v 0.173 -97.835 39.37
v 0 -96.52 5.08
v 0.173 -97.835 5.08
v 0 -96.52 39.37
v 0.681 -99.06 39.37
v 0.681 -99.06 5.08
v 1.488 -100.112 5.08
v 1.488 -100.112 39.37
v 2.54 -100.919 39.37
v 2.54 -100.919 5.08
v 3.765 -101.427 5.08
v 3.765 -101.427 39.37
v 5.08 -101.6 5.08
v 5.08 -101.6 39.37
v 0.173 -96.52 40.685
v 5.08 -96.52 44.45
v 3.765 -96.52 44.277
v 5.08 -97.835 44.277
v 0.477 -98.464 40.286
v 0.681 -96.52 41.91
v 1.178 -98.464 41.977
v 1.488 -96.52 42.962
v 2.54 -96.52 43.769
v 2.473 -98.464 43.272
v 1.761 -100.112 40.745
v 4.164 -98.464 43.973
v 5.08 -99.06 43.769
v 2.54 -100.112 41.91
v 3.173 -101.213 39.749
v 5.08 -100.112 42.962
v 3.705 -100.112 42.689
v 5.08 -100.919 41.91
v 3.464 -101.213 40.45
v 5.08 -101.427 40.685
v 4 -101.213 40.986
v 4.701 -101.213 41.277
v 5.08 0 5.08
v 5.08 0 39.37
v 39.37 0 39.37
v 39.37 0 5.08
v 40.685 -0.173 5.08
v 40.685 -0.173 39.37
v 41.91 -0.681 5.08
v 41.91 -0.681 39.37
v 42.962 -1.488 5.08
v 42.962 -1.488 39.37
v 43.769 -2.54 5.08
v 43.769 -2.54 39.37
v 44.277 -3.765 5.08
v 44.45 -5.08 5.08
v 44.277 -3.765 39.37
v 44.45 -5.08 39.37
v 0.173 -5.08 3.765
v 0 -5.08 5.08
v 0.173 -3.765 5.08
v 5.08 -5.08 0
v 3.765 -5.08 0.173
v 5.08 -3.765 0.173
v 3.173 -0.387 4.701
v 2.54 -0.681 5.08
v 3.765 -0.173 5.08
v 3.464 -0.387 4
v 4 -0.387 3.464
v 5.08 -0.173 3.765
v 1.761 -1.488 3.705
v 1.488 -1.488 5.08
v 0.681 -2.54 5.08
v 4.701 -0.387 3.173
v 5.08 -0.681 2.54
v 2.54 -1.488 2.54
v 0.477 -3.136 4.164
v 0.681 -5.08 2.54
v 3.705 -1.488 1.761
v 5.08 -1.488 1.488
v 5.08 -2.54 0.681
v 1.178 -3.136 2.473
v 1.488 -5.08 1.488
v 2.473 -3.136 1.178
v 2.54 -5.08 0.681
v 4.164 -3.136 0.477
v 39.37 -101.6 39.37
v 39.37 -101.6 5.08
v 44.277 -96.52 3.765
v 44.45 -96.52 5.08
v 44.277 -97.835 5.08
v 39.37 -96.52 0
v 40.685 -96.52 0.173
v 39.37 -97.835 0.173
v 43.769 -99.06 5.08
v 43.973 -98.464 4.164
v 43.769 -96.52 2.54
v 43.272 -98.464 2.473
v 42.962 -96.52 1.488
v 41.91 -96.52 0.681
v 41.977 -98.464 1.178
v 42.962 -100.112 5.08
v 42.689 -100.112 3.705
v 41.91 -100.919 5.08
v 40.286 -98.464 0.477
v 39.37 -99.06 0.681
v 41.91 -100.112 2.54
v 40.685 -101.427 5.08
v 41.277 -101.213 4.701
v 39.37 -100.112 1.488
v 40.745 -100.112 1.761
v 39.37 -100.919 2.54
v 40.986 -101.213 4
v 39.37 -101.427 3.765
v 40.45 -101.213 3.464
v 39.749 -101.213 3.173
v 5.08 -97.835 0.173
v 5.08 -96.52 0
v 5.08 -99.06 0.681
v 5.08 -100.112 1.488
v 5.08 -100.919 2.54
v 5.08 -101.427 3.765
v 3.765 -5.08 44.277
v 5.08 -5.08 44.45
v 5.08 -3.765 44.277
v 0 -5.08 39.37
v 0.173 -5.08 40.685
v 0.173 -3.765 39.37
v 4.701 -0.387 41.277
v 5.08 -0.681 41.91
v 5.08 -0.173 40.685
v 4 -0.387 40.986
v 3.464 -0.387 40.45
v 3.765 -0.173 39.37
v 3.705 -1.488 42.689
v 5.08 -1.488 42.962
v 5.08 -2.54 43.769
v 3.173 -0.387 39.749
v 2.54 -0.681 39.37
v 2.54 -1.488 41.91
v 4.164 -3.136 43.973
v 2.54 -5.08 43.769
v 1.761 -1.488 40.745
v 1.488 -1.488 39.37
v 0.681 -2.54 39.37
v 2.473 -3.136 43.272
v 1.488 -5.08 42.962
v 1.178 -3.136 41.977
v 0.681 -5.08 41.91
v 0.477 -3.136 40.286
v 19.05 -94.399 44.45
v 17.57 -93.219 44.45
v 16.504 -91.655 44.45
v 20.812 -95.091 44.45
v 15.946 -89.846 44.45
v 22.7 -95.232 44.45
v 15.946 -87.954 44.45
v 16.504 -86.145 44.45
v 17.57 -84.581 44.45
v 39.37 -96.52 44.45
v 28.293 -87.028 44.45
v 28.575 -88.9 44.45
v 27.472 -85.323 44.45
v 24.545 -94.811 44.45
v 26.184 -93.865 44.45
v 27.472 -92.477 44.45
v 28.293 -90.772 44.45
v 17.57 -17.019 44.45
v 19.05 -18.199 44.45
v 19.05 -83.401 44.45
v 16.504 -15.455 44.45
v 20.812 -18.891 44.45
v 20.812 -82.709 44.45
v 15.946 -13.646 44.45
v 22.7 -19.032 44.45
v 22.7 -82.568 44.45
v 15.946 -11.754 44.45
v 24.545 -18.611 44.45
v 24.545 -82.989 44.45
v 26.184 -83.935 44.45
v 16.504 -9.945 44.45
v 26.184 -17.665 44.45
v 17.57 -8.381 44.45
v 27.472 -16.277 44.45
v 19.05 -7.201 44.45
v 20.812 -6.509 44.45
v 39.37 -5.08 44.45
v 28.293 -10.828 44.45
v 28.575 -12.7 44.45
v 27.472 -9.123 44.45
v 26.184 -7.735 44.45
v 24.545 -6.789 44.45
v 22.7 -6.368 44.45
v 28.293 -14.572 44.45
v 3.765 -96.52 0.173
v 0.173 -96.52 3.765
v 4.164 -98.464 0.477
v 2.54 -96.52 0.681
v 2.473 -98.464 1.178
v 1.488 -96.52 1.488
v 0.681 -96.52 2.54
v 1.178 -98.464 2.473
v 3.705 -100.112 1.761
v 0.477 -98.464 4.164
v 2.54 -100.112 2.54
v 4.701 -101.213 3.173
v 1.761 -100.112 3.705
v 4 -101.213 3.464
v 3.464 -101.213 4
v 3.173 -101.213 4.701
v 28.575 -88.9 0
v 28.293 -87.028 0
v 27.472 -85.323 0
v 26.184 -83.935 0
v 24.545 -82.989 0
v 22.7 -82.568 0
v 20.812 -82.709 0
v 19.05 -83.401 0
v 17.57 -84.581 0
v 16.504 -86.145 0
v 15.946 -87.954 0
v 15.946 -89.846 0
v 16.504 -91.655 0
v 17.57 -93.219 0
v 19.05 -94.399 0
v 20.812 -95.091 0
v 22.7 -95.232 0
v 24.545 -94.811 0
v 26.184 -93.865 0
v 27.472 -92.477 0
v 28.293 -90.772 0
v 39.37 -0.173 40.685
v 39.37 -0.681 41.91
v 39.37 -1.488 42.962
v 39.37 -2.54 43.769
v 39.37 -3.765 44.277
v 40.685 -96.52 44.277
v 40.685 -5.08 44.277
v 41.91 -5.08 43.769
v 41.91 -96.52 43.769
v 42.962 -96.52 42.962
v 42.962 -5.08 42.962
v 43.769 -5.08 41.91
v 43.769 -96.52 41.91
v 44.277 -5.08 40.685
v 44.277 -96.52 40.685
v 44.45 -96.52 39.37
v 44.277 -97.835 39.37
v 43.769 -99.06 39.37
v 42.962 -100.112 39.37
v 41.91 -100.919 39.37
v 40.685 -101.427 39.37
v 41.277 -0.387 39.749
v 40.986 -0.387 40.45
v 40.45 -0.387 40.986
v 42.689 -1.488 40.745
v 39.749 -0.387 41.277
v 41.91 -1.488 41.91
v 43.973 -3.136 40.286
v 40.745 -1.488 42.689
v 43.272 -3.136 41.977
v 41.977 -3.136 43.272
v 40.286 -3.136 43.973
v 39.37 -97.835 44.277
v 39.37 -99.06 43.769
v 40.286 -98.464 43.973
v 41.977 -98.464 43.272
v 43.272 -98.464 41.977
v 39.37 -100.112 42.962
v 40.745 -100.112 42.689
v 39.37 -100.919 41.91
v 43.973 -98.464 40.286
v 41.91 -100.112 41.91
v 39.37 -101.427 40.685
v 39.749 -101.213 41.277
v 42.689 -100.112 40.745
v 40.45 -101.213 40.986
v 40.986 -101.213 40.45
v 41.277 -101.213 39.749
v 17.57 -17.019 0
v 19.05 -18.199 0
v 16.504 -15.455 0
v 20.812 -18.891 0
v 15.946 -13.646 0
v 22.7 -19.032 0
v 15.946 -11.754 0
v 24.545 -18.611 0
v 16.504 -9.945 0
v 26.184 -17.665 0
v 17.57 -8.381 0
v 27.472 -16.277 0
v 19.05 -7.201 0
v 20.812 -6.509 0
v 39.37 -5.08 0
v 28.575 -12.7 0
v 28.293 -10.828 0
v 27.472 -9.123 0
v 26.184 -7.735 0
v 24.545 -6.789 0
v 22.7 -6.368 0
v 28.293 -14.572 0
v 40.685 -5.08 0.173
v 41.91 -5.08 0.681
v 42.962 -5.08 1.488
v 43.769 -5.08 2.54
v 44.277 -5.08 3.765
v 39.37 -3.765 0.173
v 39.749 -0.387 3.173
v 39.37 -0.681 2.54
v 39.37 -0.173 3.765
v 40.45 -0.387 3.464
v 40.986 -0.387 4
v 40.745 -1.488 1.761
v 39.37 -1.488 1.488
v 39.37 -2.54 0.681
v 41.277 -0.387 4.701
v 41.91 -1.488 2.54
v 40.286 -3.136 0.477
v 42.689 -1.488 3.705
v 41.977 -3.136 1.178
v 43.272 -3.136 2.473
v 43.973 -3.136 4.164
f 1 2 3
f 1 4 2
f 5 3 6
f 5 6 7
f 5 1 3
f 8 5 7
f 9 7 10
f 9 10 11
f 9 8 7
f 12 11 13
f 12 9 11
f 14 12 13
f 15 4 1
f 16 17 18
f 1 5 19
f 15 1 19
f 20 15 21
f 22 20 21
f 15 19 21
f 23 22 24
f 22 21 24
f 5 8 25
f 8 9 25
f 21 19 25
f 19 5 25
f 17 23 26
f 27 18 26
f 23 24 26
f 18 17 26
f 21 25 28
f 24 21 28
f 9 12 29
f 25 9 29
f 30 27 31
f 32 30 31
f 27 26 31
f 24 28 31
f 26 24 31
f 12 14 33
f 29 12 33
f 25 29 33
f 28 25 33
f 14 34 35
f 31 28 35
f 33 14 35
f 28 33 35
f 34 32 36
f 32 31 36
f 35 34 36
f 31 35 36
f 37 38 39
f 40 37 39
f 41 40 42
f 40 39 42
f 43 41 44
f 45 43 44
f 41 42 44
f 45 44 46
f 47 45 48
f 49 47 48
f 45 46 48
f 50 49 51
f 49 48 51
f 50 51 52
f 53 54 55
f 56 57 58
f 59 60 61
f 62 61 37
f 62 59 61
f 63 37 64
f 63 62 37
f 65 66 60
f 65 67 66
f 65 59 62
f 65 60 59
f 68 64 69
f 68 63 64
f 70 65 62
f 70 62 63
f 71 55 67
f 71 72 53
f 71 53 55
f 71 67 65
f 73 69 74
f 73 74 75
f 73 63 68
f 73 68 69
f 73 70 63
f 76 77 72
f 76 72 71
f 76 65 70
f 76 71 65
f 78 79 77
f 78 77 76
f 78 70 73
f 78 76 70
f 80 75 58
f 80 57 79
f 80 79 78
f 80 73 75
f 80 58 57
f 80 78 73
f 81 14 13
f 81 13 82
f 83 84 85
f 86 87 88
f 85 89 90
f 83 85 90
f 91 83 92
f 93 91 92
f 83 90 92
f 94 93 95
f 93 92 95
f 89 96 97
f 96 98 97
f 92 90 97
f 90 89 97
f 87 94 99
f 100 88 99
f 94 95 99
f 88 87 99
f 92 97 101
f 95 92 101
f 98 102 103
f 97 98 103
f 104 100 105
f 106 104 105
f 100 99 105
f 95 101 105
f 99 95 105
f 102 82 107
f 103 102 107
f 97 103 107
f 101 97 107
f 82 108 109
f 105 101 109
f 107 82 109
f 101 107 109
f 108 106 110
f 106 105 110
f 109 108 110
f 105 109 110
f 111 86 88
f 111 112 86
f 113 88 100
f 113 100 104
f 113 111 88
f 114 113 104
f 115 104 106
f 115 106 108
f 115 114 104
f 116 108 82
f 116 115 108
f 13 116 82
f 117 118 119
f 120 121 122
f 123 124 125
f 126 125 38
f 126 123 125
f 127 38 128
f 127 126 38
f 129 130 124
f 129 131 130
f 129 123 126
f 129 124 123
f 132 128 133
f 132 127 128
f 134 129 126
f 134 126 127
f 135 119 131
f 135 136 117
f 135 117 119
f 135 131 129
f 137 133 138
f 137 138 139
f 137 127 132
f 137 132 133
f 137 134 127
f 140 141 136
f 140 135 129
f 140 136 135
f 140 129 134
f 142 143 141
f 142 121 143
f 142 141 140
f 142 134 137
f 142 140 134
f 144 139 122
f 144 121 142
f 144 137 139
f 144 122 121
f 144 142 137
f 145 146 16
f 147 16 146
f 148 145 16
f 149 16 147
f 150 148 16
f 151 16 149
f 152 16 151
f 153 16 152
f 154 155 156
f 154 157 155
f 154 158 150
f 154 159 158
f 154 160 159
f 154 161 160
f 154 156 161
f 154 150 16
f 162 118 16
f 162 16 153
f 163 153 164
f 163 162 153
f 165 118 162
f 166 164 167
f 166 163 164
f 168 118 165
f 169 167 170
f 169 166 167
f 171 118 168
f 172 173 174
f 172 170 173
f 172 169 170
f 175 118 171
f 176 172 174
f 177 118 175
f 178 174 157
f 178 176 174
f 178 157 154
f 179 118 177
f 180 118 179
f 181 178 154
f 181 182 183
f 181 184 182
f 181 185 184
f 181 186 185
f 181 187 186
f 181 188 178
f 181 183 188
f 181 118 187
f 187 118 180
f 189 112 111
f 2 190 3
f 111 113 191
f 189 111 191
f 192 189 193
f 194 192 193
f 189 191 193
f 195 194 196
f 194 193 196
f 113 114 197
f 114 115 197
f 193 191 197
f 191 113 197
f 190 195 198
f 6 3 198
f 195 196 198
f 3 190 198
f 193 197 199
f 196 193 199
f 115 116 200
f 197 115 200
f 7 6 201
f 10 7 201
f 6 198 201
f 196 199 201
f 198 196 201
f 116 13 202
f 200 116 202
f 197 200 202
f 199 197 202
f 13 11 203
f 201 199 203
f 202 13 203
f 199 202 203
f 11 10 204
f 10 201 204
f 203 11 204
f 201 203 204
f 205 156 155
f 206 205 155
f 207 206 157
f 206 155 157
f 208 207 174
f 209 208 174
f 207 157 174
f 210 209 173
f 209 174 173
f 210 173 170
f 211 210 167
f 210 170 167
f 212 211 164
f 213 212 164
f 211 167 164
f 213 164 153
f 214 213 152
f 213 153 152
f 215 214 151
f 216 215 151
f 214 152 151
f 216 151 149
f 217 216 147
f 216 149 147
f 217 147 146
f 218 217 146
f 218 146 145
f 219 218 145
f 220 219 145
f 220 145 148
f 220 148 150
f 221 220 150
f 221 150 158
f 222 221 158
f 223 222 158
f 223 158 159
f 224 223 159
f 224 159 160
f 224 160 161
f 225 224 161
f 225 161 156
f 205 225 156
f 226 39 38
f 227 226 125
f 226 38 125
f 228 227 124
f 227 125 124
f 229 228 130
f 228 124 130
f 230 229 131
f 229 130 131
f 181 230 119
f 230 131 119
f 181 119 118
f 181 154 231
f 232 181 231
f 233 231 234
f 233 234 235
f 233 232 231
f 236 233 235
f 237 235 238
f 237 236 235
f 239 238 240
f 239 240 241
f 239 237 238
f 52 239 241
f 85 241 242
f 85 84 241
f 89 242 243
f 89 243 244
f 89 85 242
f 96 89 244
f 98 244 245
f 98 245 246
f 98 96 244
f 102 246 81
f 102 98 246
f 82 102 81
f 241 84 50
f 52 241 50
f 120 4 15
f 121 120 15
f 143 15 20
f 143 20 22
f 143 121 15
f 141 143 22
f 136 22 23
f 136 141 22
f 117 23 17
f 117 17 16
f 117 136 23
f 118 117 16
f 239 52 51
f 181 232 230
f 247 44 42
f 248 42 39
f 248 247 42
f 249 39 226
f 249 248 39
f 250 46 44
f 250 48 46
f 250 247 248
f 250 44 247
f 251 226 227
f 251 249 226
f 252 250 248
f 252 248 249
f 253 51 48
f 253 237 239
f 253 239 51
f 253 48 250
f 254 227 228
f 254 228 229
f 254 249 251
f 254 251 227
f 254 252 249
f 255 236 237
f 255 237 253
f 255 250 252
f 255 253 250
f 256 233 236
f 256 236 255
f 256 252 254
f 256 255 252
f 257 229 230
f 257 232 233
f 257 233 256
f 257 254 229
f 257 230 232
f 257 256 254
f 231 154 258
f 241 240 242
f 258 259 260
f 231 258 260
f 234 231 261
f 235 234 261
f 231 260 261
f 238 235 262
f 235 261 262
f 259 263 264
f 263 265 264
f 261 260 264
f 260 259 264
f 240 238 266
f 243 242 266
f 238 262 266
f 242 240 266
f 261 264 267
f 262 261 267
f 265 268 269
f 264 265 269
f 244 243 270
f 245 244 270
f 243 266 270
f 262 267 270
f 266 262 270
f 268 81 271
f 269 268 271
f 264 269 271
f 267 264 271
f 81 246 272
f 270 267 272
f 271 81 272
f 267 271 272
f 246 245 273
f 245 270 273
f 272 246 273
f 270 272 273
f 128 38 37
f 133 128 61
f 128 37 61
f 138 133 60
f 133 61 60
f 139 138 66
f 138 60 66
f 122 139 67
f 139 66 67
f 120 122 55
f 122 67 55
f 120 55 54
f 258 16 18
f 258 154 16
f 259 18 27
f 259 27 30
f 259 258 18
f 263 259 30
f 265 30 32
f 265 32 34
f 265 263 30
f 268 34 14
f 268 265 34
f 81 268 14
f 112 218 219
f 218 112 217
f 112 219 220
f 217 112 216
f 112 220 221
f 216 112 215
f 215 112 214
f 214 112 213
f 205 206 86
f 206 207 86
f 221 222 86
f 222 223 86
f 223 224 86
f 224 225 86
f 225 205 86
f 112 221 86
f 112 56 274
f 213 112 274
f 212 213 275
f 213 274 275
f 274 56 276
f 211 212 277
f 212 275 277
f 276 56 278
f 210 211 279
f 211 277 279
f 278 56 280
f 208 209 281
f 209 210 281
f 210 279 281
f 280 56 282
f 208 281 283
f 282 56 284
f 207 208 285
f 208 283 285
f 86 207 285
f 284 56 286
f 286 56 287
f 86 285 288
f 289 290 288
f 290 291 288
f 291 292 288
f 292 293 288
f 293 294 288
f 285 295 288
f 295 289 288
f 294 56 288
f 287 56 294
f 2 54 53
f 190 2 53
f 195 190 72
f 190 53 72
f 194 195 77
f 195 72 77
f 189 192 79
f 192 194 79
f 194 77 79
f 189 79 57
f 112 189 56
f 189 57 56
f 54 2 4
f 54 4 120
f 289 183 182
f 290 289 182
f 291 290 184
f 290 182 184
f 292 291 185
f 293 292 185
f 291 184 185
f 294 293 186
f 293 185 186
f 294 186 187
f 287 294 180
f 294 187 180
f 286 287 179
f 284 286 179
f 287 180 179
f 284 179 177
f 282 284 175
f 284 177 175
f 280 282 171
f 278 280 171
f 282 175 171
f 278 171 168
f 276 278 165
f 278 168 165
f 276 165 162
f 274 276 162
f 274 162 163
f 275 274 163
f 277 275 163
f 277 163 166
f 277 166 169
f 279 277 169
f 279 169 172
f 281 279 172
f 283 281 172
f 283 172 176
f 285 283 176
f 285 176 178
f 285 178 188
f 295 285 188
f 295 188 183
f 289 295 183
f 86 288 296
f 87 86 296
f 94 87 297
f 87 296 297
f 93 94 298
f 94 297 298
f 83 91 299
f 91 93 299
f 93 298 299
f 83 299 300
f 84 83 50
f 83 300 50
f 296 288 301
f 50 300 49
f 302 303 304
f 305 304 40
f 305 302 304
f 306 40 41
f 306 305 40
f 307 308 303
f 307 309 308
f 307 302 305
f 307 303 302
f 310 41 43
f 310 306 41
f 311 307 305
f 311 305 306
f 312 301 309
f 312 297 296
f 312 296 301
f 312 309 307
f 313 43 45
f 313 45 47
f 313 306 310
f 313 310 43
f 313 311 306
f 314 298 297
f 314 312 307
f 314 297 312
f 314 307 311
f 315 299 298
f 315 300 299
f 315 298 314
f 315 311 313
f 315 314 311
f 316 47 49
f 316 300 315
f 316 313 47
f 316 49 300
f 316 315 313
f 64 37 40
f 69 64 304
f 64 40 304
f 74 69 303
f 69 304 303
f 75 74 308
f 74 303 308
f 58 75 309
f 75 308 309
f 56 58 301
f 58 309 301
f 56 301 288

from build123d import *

# Parameters (mm, degrees)
F0_W     = 44.45
F0_H     = 101.6
F1_DEPTH = 44.45
F2_R     = 6.35
F3_DEPTH = 59.69
F4_R     = 5.08
F5_R     = 5.08


with BuildPart() as f1:
    # F0 (on Top) → F1 (new body)
    with BuildSketch(Plane.XY):
        with Locations((22.225, -50.8)):
            Rectangle(F0_W, F0_H)
    extrude(amount=F1_DEPTH)

    # F2 (on face) → F3 (cut)
    with BuildSketch(Plane.XY.offset(44.45)):
        with Locations((22.225, -12.7)):
            Circle(F2_R)
        with Locations((22.225, -88.9)):
            Circle(F2_R)
    extrude(amount=-F3_DEPTH, mode=Mode.SUBTRACT)

    # F4
    f4_edges = [f1.edges().sort_by_distance(p)[0] for p in [
        (44.45, -50.8, 44.45),
        (44.45, -50.8, 0),
        (0, -50.8, 0),
        (0, -50.8, 44.45),
    ]]
    fillet(f4_edges, radius=F4_R)

    # F5
    f5_edges = [f1.edges().sort_by_distance(p)[0] for p in [
        (44.45, 0, 22.225),
        (42.962102, 0, 1.487898),
        (42.962102, 0, 42.962102),
        (22.225, 0, 0),
        (22.225, 0, 44.45),
        (1.487898, 0, 1.487898),
        (1.487898, 0, 42.962102),
        (0, 0, 22.225),
        (0, -101.6, 22.225),
        (1.487898, -101.6, 1.487898),
        (1.487898, -101.6, 42.962102),
        (22.225, -101.6, 0),
        (22.225, -101.6, 44.45),
        (42.962102, -101.6, 1.487898),
        (42.962102, -101.6, 42.962102),
        (44.45, -101.6, 22.225),
    ]]
    fillet(f5_edges, radius=F5_R)


solid = f1.part
